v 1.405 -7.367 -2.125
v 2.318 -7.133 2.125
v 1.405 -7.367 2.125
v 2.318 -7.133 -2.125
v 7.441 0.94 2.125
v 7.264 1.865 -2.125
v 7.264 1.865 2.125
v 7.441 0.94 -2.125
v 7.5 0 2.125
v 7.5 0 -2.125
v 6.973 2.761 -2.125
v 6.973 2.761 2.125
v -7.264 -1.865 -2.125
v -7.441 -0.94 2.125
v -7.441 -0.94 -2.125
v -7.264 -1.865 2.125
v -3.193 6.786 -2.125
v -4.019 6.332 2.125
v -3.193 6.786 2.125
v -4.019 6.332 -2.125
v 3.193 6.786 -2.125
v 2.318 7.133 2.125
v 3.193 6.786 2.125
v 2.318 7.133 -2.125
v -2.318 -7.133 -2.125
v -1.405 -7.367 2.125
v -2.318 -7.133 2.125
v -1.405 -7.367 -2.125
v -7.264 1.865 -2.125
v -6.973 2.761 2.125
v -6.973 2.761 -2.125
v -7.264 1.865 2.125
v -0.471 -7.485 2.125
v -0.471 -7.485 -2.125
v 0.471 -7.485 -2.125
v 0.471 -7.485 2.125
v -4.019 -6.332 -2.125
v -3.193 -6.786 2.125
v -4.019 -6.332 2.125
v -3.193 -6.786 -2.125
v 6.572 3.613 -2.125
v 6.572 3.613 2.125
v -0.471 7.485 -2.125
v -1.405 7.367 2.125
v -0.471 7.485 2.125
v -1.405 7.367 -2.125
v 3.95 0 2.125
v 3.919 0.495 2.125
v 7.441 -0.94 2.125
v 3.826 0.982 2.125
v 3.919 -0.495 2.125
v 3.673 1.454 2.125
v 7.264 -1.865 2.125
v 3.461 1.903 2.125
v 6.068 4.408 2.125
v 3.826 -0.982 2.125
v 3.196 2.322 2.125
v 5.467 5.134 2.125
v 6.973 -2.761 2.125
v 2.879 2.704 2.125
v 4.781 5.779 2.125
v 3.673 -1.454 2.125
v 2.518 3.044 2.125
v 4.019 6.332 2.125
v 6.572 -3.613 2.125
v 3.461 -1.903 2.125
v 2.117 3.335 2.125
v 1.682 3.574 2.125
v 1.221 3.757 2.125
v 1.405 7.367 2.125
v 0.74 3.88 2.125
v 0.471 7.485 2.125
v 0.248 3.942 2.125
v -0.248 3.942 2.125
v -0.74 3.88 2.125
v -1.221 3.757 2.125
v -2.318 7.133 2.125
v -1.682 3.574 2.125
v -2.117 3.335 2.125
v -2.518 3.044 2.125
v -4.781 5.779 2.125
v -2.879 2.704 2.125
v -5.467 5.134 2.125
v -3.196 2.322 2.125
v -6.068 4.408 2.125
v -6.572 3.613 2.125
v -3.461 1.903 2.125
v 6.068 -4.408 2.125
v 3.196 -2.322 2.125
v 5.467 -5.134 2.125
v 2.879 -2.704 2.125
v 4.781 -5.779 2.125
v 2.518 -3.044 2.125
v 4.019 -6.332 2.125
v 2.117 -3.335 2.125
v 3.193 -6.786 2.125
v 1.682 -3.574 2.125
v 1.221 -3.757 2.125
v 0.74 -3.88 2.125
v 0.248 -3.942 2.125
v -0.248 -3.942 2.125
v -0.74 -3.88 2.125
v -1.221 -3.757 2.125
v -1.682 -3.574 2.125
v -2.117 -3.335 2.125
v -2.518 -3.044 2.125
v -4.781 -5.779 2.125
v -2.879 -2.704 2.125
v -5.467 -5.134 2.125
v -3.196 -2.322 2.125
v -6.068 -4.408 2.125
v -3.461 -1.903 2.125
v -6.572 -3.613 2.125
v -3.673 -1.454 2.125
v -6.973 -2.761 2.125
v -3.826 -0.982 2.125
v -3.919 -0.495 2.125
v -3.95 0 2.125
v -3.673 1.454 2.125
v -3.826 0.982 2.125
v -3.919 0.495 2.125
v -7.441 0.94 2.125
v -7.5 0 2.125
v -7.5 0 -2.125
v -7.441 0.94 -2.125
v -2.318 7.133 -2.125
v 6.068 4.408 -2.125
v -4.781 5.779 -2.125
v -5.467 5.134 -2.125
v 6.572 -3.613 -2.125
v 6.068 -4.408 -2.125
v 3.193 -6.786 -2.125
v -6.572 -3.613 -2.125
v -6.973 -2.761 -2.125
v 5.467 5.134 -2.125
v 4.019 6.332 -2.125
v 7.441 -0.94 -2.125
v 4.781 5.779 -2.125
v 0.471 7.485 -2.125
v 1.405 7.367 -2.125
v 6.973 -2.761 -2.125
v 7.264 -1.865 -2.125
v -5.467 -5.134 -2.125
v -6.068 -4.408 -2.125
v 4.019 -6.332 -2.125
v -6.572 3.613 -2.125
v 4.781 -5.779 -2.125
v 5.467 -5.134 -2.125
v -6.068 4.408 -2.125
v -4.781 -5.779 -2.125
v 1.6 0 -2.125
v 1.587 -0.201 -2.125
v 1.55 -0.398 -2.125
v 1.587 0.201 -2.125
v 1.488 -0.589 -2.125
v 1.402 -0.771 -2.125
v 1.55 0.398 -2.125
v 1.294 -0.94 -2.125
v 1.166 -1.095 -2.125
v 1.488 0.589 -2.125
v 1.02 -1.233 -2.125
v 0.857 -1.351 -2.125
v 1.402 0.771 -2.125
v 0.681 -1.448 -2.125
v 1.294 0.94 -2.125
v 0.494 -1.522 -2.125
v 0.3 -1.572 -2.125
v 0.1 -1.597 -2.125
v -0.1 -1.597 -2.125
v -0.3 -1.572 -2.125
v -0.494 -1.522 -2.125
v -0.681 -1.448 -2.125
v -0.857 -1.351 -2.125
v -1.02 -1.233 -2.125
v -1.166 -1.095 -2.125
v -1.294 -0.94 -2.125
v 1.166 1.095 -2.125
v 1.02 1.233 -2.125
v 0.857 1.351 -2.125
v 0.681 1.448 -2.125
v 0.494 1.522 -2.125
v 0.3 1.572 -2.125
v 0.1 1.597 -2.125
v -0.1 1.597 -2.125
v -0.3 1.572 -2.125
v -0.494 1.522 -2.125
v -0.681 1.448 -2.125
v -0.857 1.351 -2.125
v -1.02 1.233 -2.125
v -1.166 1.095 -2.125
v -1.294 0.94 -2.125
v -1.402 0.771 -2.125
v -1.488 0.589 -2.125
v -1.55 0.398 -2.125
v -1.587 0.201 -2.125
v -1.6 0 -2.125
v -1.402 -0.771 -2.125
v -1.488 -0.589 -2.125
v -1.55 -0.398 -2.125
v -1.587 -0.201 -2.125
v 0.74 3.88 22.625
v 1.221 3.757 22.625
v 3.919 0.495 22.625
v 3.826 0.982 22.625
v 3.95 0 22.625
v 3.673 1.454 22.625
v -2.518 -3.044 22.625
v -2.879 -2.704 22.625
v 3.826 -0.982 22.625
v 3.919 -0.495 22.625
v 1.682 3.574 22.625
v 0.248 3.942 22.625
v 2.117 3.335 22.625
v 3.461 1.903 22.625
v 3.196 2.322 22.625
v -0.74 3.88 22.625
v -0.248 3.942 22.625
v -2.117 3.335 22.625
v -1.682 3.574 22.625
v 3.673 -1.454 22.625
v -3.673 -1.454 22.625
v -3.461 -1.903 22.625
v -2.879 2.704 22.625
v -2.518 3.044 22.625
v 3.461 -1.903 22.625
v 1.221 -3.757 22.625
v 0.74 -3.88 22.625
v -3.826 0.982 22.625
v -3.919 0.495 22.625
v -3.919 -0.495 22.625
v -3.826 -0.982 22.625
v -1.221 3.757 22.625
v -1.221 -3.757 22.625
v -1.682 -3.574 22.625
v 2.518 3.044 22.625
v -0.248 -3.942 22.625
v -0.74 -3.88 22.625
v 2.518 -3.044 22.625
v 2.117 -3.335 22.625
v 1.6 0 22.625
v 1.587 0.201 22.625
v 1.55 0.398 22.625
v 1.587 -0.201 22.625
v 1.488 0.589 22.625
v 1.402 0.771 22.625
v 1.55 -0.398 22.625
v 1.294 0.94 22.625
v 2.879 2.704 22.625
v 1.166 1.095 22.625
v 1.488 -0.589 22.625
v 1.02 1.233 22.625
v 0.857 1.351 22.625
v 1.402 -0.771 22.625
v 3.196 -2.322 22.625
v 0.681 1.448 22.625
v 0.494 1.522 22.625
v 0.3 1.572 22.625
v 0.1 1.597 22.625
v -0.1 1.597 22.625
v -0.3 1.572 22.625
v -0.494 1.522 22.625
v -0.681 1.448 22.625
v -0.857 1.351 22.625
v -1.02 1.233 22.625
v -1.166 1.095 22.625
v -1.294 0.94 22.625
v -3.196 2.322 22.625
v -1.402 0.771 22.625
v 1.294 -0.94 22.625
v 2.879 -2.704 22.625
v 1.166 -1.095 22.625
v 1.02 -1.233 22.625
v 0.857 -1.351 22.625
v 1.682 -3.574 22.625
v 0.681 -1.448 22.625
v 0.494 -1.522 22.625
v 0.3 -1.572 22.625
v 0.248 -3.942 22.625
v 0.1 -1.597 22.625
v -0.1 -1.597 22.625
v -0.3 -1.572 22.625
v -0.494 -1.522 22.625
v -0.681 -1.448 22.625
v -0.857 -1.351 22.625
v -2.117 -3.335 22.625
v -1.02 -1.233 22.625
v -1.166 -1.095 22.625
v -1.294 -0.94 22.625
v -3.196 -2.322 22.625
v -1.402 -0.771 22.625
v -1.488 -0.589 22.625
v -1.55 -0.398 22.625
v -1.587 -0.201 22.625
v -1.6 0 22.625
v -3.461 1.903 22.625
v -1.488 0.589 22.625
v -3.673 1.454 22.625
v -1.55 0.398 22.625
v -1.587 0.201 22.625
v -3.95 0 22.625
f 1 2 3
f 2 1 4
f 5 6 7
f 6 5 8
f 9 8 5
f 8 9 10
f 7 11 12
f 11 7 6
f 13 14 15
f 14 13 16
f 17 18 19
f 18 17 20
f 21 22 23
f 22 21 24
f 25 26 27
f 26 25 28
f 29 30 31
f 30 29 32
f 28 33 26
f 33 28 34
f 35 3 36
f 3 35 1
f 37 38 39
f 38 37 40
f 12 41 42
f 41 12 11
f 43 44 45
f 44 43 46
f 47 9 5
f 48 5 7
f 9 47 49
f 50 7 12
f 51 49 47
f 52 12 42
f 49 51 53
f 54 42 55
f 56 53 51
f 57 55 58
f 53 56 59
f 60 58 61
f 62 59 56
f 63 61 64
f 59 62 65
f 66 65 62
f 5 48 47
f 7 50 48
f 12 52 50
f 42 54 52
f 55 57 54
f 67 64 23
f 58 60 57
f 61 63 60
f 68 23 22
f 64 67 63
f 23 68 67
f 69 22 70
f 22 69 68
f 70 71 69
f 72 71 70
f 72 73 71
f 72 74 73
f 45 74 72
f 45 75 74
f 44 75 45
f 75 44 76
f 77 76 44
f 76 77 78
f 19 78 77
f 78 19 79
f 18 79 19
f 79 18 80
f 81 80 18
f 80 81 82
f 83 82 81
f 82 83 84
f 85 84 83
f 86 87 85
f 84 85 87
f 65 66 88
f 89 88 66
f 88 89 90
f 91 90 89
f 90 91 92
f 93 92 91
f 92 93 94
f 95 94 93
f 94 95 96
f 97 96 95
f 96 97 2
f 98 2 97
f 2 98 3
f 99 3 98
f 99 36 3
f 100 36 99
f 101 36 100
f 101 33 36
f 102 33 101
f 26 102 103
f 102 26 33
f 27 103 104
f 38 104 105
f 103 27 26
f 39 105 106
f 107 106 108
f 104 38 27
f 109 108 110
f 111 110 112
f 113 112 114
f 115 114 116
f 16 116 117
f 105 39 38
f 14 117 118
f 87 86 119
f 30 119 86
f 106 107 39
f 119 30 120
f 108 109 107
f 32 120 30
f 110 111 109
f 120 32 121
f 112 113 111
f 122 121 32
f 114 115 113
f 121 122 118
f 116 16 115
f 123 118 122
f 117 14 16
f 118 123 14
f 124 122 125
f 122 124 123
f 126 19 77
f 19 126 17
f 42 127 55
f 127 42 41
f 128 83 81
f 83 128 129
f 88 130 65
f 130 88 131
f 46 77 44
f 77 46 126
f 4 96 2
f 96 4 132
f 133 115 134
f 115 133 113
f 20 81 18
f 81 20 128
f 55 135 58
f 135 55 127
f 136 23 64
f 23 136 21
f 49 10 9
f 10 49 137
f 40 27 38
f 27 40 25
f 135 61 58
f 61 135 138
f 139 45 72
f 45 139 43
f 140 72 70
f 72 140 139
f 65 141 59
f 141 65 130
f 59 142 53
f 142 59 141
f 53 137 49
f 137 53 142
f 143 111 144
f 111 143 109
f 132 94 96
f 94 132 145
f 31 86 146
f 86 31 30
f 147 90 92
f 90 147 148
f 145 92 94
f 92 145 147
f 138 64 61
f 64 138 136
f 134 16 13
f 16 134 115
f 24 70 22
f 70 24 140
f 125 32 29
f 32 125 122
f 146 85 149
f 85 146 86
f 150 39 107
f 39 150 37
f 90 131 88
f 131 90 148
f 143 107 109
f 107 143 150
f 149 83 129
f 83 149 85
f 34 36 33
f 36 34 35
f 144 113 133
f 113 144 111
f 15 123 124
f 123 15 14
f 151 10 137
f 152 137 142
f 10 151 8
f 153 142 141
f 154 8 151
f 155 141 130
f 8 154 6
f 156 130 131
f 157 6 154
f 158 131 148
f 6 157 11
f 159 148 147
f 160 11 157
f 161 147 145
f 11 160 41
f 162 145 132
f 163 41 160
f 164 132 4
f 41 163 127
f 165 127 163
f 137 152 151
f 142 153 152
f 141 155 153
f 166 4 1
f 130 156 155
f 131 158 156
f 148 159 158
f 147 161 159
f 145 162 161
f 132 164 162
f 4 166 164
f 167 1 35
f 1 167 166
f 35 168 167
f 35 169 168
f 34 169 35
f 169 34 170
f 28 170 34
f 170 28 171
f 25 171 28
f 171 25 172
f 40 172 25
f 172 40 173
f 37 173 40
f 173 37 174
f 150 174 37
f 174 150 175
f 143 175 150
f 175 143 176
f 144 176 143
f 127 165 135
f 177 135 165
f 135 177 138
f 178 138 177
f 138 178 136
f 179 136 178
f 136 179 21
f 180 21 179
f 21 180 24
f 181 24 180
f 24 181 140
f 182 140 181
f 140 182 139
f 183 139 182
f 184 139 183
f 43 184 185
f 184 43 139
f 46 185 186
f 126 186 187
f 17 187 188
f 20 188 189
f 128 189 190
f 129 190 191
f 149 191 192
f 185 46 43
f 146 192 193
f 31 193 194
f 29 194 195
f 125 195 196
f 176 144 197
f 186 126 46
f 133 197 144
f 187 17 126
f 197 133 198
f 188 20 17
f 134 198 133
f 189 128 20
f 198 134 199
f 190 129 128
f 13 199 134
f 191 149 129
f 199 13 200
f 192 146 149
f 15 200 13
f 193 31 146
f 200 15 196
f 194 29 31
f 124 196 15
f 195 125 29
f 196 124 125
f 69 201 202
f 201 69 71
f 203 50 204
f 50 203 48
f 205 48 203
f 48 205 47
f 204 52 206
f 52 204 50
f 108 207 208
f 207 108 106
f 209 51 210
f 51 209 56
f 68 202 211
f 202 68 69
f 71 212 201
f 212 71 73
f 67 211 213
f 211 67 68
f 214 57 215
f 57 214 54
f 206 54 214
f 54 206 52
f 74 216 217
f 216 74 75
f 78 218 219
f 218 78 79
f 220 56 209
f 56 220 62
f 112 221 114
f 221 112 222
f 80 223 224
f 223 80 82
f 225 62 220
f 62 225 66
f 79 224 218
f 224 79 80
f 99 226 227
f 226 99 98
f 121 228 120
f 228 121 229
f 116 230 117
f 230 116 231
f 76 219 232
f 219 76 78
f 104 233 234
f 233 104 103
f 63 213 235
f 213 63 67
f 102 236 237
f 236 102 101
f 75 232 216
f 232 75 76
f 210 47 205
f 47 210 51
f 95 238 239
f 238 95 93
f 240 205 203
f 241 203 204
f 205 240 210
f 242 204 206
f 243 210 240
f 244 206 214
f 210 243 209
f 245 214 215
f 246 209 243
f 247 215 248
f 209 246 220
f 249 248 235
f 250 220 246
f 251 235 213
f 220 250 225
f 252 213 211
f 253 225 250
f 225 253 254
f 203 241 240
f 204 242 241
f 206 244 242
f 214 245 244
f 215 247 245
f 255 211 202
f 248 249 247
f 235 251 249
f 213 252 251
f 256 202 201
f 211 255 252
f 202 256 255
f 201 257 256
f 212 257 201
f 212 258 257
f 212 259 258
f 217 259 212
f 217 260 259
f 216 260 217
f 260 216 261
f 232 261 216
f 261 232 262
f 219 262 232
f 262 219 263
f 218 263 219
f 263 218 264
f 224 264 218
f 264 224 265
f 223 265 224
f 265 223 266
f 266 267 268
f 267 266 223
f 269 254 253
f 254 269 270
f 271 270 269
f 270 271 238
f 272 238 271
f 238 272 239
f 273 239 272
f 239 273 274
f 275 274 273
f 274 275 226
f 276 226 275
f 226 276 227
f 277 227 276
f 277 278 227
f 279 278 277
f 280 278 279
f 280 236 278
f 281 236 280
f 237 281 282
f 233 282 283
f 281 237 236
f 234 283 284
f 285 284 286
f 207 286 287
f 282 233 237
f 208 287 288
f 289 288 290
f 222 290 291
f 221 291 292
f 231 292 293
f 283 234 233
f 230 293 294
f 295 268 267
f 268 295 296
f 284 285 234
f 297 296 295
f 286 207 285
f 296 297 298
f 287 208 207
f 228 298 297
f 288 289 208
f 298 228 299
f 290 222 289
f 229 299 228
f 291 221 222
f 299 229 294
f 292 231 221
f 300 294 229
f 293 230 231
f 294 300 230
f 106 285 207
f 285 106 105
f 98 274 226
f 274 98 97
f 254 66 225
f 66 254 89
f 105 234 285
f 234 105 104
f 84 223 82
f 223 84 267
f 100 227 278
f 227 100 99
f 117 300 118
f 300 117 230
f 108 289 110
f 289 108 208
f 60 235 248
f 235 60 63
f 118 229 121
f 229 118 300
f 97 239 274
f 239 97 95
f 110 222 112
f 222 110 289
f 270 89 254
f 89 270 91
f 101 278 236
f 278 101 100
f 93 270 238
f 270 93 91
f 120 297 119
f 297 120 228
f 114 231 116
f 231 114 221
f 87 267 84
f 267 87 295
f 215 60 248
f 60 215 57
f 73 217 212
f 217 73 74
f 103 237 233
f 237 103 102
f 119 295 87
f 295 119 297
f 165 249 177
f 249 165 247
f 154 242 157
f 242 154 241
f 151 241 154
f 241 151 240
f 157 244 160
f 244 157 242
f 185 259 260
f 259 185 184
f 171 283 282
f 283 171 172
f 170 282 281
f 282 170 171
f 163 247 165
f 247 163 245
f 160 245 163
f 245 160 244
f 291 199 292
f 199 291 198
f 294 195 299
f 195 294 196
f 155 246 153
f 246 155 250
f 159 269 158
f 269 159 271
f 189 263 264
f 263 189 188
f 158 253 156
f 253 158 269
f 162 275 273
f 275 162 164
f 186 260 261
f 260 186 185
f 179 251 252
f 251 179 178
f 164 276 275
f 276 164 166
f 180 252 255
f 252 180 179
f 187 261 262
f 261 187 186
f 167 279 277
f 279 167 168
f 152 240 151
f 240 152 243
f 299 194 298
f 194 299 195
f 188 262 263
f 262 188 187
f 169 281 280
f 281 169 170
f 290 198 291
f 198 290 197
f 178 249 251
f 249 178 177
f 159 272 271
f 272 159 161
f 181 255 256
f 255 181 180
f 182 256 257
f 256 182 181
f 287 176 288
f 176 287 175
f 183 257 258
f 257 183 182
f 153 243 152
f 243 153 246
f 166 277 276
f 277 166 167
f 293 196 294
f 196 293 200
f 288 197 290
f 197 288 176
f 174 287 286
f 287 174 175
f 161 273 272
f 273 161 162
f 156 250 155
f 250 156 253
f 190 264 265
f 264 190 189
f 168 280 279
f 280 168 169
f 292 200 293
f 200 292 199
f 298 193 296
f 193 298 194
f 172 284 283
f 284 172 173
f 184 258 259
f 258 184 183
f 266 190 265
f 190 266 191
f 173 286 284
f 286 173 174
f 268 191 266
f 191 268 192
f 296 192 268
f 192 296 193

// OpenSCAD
// roller hub

hub_major_dia = 15;
hub_minor_dia = 7.9;

tool_z = 18.5;
m4_pilot = 3.2;

bearing_id = 8;
bearing_od = 16;
bearing_z = 5;

$fn = 50;

difference () {
    {
    union () {
        cylinder (r = hub_major_dia/2, h = tool_z/2 - bearing_z, center = true);
        translate([0,0, (tool_z/2 - bearing_z)/2 + (tool_z + 2)/2])
        cylinder (r = hub_minor_dia/2, h = tool_z + 2, center = true);
        }
    }
    {
        translate([0,0,8])
        cylinder(r = m4_pilot/2, h = 30, center = true);
    }
}
